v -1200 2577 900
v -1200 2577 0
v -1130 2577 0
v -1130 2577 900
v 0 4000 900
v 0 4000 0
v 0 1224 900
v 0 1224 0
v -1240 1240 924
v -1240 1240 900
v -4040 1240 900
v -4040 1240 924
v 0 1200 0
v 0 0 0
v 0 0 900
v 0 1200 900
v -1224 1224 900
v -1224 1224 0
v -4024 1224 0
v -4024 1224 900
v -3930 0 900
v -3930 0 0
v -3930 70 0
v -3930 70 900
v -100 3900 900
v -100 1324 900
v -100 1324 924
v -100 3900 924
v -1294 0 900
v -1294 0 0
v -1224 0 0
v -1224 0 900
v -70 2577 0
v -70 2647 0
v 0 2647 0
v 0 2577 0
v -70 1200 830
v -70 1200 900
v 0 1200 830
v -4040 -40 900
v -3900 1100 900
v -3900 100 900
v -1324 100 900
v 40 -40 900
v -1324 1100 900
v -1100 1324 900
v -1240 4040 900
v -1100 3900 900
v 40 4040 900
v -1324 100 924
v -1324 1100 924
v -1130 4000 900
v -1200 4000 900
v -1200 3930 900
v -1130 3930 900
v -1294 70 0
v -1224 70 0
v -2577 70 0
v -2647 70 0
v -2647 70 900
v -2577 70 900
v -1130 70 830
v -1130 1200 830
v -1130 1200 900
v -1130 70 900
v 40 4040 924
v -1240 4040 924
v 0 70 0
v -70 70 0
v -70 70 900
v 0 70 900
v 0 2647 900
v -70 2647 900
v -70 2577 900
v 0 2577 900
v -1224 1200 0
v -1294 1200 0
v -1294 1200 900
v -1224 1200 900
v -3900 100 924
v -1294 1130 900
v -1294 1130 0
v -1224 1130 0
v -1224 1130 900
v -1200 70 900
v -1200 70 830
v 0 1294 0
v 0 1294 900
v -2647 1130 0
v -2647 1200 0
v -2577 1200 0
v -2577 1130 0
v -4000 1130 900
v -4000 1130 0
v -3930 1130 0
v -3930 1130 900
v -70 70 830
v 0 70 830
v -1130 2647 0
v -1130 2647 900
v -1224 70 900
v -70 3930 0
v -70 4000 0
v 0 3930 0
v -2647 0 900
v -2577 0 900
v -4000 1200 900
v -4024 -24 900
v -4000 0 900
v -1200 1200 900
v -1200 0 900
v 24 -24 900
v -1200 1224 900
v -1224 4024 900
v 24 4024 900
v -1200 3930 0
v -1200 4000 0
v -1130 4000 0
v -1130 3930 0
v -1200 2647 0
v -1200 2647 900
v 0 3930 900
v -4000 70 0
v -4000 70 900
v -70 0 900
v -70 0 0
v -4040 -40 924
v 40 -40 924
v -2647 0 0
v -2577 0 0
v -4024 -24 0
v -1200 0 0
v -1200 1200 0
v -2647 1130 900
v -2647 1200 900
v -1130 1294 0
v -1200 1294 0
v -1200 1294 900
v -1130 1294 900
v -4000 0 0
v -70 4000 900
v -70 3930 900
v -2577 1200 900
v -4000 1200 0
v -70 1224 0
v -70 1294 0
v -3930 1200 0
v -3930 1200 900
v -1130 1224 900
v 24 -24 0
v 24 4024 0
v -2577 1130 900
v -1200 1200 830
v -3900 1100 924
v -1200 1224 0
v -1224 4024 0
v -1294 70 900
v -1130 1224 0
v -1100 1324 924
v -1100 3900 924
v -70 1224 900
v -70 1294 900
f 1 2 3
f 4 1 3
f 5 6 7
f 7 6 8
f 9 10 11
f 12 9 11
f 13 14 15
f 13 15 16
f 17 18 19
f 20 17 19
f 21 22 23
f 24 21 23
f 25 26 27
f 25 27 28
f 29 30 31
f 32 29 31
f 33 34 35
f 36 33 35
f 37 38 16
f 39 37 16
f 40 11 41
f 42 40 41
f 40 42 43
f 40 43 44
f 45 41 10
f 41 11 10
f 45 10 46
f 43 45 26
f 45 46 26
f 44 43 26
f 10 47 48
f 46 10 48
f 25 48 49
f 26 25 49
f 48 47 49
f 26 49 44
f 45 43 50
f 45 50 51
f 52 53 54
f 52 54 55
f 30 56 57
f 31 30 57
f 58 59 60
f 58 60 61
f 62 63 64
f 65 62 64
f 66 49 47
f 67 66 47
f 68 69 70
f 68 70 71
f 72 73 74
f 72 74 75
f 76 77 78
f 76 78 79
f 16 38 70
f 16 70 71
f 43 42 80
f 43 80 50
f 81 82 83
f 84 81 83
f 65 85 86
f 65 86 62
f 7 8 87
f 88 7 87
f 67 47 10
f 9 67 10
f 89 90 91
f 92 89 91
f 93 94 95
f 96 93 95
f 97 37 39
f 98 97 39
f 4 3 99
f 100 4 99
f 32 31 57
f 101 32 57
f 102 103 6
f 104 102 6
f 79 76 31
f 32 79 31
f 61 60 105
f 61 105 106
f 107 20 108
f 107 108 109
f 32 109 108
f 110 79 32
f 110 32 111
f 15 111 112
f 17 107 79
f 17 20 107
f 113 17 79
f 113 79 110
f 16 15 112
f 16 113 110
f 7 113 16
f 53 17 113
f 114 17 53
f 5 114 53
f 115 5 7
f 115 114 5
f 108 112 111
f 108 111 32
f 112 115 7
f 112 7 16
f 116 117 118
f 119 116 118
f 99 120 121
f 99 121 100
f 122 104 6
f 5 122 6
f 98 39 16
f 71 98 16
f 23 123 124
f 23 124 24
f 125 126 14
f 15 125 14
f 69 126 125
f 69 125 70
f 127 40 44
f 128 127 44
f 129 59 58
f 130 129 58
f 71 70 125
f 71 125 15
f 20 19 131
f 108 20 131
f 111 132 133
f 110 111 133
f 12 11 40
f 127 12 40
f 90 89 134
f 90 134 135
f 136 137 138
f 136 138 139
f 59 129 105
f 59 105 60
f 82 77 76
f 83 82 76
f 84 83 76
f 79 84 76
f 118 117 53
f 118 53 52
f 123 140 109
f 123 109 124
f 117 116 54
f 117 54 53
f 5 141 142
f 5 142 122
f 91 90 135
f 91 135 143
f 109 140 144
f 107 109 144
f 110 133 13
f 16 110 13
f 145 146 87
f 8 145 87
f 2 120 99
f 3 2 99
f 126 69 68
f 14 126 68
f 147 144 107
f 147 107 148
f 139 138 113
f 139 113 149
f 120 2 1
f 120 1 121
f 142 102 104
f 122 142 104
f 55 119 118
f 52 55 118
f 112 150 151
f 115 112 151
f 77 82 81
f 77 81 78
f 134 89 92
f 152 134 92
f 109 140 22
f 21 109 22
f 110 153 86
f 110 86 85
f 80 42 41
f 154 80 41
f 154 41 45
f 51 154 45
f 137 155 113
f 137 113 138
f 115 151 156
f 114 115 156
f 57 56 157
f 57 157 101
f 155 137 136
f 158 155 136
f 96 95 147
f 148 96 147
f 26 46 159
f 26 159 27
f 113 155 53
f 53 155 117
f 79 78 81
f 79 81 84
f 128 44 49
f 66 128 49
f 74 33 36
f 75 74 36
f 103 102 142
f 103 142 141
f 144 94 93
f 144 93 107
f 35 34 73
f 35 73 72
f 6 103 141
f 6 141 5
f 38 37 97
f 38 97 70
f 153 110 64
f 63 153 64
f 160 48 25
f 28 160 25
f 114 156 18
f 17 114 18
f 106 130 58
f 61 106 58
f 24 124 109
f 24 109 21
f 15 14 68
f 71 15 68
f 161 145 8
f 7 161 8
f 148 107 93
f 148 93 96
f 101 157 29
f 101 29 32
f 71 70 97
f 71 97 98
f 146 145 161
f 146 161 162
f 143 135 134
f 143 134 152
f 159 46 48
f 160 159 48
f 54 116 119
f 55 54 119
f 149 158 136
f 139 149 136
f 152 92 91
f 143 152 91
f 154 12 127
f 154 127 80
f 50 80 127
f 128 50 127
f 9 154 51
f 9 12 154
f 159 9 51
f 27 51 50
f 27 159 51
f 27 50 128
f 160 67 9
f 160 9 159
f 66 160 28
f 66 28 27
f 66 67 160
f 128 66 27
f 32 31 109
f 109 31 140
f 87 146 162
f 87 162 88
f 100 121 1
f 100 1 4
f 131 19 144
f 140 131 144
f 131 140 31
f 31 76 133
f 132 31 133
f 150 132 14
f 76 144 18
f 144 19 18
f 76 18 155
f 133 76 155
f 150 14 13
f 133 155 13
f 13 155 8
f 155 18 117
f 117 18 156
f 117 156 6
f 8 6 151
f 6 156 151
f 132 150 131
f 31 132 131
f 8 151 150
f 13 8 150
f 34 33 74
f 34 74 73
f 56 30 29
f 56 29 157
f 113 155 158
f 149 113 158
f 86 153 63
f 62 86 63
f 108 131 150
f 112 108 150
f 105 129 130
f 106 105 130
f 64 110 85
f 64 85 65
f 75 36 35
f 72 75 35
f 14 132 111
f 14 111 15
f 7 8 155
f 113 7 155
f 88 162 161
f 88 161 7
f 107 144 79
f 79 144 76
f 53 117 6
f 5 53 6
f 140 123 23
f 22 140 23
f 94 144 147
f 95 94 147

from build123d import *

# Parameters (mm, degrees)
F1_W     = 70
F1_H     = 70
F2_DEPTH = 900
F3_W     = 1200
F3_H     = 1200
F4_DEPTH = 900
F5_W     = 70
F5_H     = 70
F6_DEPTH = 1130
F7_W     = 2576
F7_H     = 1000
F7_W_2   = 1000
F7_H_2   = 2576
F8_DEPTH = 24


with BuildPart() as f2:
    # F1 (on Top) → F2 (new body)
    with BuildSketch(Plane.XY):
        with Locations((-1165, 3965)):
            Rectangle(F1_W, F1_H)
        with Locations((-35, 3965)):
            Rectangle(F1_W, F1_H)
        with Locations((-1165, 1259)):
            Rectangle(F1_W, F1_H)
        with Locations((-1259, 1165)):
            Rectangle(F1_W, F1_H)
        with Locations((-35, 35)):
            Rectangle(F1_W, F1_H)
        with Locations((-3965, 35)):
            Rectangle(F1_W, F1_H)
        with Locations((-3965, 1165)):
            Rectangle(F1_W, F1_H)
        with Locations((-1165, 2612)):
            Rectangle(F1_W, F1_H)
        with Locations((-35, 1259)):
            Rectangle(F1_W, F1_H)
        with Locations((-35, 2612)):
            Rectangle(F1_W, F1_H)
        with Locations((-2612, 1165)):
            Rectangle(F1_W, F1_H)
        with Locations((-2612, 35)):
            Rectangle(F1_W, F1_H)
        with Locations((-1259, 35)):
            Rectangle(F1_W, F1_H)
    extrude(amount=F2_DEPTH)


with BuildPart() as f4:
    # F3 (on Top) → F4 (new body)
    with BuildSketch(Plane.XY):
        Polygon((-1200, 1224), (-1200, 4000), (-1224, 4000), (-1224, 1224), (-4000, 1224), (-4000, 1200), (-1224, 1200), (-1224, 0), (-4000, 0), (-4000, -24), (0, -24), (24, -24), (24, 4000), (0, 4000), (0, 1224), align=None)
        with Locations((-600, 600)):
            Rectangle(F3_W, F3_H, mode=Mode.SUBTRACT)
        Polygon((-1224, 4000), (-1200, 4000), (0, 4000), (24, 4000), (24, 4024), (-1224, 4024), align=None)
        Polygon((-4000, 1200), (-4000, 1224), (-4024, 1224), (-4024, -24), (-4000, -24), (-4000, 0), align=None)
    extrude(amount=F4_DEPTH)


with BuildPart() as f6:
    # F5 (on face) → F6 (new body, through all)
    with BuildSketch(Plane.XZ.offset(-1200)):
        with Locations((-1165, 865)):
            Rectangle(F5_W, F5_H)
        with Locations((-35, 865)):
            Rectangle(F5_W, F5_H)
    extrude(amount=F6_DEPTH)


with BuildPart() as f8:
    # F7 (on face) → F8 (new body)
    with BuildSketch(Plane.XY.offset(900)):
        Polygon((40, 4040), (-1240, 4040), (-1240, 1240), (-4040, 1240), (-4040, -40), (40, -40), align=None)
        with Locations((-2612, 600)):
            Rectangle(F7_W, F7_H, mode=Mode.SUBTRACT)
        with Locations((-600, 2612)):
            Rectangle(F7_W_2, F7_H_2, mode=Mode.SUBTRACT)
    extrude(amount=F8_DEPTH)


solid = Compound([f2.part, f4.part, f6.part, f8.part])
